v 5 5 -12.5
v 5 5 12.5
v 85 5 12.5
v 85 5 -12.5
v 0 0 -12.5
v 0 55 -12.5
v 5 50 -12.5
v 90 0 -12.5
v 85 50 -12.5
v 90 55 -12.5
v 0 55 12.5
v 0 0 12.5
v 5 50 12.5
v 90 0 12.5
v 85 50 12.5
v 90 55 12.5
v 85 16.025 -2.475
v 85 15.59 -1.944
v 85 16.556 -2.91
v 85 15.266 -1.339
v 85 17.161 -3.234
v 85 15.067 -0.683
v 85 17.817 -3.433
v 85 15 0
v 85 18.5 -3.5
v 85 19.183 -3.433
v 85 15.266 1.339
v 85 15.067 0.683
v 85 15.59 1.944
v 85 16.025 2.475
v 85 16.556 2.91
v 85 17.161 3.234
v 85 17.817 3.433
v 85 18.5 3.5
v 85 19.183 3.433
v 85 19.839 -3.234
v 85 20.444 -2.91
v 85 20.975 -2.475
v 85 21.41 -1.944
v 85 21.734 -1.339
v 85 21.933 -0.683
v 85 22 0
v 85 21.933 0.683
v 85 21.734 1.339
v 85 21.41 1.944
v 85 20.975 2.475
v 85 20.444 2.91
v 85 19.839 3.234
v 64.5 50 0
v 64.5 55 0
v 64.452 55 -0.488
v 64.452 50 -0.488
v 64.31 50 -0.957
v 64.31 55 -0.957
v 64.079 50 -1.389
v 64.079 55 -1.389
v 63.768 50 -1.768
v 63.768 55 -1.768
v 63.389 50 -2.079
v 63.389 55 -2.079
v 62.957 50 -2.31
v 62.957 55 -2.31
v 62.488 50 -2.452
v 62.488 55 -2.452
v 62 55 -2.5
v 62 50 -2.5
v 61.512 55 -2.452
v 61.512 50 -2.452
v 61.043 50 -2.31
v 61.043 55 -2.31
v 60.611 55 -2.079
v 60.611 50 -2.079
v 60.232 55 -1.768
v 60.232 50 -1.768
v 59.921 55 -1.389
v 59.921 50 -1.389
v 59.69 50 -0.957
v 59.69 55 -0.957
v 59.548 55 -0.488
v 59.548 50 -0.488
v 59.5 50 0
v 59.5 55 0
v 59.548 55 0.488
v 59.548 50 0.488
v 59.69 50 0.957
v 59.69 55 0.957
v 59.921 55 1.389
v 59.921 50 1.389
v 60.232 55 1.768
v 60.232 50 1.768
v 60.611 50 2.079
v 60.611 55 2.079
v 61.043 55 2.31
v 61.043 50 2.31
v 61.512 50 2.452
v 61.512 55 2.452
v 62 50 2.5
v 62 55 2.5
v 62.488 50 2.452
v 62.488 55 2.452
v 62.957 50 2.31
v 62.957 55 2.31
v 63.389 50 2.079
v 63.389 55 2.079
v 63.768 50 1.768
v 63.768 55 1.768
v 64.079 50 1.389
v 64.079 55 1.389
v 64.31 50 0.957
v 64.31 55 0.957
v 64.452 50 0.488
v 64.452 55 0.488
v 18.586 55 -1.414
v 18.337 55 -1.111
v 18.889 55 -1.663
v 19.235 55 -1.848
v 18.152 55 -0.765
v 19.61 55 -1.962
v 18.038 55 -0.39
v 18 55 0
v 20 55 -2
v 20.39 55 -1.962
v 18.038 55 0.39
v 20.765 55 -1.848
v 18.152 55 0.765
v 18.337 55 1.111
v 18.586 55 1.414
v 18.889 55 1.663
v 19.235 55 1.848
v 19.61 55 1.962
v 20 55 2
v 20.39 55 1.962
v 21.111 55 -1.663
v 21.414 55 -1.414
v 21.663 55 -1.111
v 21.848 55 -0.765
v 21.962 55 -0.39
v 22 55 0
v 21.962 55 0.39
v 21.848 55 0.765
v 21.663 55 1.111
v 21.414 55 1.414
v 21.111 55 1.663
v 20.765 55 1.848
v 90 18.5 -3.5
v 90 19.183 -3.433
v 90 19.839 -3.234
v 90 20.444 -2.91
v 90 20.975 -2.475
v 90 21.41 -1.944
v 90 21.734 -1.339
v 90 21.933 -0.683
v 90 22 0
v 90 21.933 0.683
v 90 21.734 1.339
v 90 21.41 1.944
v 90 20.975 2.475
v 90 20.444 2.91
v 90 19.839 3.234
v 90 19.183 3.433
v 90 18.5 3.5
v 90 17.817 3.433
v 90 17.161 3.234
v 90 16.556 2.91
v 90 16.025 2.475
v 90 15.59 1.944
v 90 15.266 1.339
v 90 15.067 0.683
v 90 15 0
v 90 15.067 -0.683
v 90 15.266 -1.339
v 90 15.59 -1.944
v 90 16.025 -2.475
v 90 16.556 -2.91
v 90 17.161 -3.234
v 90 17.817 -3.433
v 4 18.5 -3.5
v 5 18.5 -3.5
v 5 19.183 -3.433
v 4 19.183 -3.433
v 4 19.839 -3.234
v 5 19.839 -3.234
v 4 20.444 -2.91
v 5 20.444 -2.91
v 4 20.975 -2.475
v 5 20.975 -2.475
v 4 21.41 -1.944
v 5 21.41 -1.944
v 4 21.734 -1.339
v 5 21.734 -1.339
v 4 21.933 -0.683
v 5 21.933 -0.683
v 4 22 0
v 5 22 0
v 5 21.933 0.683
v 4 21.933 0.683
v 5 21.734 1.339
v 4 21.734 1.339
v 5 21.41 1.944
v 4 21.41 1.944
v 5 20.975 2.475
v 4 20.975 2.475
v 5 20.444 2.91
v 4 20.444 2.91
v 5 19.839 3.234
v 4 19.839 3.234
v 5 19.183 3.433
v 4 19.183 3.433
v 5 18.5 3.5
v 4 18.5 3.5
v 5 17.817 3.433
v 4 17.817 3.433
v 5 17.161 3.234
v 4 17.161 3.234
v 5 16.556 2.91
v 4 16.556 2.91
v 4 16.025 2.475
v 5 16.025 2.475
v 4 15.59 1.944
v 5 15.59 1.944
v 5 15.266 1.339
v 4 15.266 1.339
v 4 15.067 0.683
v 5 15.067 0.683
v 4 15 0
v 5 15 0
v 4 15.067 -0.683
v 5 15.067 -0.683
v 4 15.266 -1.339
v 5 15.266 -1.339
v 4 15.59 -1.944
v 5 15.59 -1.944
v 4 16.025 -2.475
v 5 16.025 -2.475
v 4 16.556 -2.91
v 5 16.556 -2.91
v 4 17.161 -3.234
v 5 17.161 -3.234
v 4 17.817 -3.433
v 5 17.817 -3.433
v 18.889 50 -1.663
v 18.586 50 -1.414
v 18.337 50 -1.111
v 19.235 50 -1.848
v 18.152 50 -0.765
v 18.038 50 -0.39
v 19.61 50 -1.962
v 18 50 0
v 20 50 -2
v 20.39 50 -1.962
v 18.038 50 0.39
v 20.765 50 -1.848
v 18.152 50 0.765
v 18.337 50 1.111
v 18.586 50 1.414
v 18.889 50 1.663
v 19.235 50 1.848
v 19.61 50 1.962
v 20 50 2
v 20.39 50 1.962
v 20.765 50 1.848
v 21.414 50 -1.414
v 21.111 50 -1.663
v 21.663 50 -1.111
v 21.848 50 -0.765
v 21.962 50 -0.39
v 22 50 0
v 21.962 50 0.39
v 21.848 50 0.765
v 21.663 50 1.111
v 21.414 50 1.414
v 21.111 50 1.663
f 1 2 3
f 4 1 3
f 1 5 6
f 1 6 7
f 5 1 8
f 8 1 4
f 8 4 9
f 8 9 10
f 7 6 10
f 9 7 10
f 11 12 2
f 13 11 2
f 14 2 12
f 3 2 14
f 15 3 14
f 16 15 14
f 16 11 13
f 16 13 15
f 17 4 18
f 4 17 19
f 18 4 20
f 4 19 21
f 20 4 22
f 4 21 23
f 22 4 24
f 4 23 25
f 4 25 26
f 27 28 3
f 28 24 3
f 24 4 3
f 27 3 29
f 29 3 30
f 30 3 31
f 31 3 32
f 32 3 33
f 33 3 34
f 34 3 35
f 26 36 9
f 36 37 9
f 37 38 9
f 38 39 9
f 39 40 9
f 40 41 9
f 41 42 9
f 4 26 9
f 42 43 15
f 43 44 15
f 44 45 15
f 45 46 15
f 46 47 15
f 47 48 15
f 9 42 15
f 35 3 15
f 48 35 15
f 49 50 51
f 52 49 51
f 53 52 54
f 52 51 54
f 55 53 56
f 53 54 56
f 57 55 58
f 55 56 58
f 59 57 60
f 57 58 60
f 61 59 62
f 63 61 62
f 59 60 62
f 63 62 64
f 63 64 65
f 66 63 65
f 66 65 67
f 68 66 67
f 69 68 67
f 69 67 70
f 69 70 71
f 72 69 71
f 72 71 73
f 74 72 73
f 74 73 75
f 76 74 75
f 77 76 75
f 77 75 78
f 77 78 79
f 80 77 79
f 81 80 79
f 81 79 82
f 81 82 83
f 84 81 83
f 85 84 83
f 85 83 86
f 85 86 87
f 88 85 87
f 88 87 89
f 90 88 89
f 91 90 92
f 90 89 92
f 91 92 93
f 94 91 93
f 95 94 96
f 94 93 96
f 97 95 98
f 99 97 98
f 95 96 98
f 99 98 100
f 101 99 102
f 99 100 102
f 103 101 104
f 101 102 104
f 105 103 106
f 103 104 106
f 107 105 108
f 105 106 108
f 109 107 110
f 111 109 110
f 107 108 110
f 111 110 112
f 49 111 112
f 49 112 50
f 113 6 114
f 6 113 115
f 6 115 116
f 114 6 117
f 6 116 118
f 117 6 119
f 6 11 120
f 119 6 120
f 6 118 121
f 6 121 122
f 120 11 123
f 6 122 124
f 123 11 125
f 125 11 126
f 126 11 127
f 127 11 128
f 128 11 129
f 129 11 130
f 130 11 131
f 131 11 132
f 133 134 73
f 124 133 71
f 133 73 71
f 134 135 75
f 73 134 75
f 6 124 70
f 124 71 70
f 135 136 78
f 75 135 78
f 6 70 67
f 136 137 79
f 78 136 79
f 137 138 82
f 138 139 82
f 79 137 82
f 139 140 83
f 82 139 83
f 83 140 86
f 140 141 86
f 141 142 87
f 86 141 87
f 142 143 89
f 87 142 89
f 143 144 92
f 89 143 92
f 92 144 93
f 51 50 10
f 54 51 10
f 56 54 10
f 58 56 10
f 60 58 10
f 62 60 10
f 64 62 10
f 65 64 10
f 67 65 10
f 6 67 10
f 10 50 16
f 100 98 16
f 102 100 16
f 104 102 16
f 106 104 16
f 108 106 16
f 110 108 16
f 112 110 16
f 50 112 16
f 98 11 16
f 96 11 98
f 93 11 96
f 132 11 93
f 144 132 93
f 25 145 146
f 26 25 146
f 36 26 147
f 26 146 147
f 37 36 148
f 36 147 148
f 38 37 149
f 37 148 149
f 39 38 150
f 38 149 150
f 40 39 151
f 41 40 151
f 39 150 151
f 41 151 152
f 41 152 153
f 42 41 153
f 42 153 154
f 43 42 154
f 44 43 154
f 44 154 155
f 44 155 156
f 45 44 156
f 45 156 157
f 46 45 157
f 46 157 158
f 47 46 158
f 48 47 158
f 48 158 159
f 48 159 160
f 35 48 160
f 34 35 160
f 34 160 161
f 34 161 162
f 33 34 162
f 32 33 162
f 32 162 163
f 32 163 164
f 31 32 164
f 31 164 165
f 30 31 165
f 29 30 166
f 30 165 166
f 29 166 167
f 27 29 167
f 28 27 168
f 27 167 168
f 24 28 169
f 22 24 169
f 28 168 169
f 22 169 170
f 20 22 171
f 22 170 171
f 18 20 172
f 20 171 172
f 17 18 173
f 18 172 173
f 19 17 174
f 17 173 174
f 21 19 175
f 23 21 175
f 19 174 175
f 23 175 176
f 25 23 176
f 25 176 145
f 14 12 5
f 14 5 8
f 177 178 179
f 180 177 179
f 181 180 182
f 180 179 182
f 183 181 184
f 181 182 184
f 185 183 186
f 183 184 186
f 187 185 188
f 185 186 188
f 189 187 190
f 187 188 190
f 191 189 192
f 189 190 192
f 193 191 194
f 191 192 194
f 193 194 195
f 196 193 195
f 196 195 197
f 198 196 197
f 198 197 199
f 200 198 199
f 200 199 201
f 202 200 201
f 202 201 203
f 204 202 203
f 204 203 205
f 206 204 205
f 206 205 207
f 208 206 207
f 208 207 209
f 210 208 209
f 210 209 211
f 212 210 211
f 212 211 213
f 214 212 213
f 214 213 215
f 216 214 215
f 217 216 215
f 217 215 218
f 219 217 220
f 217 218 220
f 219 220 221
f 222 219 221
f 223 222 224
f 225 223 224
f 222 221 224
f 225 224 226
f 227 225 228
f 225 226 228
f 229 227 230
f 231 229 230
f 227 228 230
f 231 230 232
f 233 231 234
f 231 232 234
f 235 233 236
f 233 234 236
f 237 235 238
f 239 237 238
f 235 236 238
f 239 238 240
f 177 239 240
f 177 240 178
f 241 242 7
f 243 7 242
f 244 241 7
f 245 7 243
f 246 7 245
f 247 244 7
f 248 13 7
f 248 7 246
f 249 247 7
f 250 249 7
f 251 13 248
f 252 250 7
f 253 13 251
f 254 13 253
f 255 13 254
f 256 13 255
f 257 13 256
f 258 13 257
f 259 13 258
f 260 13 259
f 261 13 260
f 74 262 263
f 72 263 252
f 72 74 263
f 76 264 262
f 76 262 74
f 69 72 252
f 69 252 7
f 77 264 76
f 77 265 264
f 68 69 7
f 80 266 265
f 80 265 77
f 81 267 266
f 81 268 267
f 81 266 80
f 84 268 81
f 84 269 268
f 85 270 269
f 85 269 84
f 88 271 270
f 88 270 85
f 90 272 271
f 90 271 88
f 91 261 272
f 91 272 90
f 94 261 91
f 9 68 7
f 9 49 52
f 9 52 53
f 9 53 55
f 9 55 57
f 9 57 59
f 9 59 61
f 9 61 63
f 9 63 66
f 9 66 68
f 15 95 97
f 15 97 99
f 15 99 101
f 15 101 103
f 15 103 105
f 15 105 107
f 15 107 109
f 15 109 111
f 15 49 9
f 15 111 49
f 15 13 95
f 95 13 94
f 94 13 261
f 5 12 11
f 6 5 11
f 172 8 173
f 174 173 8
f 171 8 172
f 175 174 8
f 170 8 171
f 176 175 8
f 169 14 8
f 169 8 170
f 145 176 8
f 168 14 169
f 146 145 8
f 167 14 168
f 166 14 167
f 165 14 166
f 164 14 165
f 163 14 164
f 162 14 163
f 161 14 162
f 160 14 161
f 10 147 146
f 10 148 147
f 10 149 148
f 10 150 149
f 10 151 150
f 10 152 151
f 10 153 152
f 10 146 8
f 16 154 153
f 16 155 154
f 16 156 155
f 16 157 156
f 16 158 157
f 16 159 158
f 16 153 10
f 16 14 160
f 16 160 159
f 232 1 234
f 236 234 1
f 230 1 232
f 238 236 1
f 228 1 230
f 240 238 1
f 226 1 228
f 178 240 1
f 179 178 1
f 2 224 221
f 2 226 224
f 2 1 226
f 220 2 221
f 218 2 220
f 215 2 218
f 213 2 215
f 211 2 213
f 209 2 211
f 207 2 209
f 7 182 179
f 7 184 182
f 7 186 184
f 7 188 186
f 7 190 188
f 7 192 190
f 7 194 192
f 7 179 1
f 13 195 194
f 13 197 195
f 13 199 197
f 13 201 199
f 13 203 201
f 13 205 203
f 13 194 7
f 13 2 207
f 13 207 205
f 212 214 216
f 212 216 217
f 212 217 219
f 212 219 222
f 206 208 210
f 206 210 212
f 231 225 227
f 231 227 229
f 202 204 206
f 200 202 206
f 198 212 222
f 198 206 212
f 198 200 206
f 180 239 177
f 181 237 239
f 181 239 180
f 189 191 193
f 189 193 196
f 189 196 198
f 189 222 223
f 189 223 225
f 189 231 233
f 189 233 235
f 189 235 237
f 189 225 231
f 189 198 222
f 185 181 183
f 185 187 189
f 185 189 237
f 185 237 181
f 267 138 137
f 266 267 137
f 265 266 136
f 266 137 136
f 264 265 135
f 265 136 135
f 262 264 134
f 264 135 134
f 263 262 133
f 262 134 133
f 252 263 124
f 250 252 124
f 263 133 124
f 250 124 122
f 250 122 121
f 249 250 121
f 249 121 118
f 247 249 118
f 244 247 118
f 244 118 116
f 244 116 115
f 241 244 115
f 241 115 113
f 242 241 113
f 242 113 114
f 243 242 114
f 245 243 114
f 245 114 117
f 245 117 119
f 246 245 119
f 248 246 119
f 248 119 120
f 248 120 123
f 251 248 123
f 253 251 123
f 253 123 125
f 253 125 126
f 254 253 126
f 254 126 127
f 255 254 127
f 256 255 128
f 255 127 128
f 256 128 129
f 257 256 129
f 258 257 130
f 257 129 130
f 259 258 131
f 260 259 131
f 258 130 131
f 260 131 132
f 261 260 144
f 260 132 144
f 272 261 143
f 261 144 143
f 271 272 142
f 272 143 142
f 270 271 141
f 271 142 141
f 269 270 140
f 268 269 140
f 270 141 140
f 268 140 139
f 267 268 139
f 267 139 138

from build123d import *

# Parameters (mm, degrees)
CROQUIS2_W              = 90
CROQUIS2_H              = 55
CROQUIS2_W_2            = 80
CROQUIS2_H_2            = 45
SALIENTE_EXTRUIR2_DEPTH = 12.5
CROQUIS4_R              = 3.5
CORTAR_EXTRUIR2_DEPTH   = 86
CROQUIS5_R              = 2
CROQUIS5_R_2            = 2.5
CORTAR_EXTRUIR4_DEPTH   = 10


with BuildPart() as part:
    # Croquis2 → Saliente-Extruir2 (new body, symmetric)
    with BuildSketch(Plane.XY):
        with Locations((45, 27.5)):
            Rectangle(CROQUIS2_W, CROQUIS2_H)
        with Locations((45, 27.5)):
            Rectangle(CROQUIS2_W_2, CROQUIS2_H_2, mode=Mode.SUBTRACT)
    extrude(amount=SALIENTE_EXTRUIR2_DEPTH, both=True)

    # Croquis4 → Cortar-Extruir2 (cut)
    with BuildSketch(Plane(origin=(90, 0, 0), x_dir=(0, 0, -1), z_dir=(1, 0, 0))):
        with Locations((0, 18.5)):
            Circle(CROQUIS4_R)
    extrude(amount=-CORTAR_EXTRUIR2_DEPTH, mode=Mode.SUBTRACT)

    # Croquis5 → Cortar-Extruir4 (cut)
    with BuildSketch(Plane(origin=(0, 55, 0), x_dir=(1, 0, 0), z_dir=(0, 1, 0))):
        with Locations((20, 0)):
            Circle(CROQUIS5_R)
        with Locations((62, 0)):
            Circle(CROQUIS5_R_2)
    extrude(amount=-CORTAR_EXTRUIR4_DEPTH, mode=Mode.SUBTRACT)


solid = part.part
